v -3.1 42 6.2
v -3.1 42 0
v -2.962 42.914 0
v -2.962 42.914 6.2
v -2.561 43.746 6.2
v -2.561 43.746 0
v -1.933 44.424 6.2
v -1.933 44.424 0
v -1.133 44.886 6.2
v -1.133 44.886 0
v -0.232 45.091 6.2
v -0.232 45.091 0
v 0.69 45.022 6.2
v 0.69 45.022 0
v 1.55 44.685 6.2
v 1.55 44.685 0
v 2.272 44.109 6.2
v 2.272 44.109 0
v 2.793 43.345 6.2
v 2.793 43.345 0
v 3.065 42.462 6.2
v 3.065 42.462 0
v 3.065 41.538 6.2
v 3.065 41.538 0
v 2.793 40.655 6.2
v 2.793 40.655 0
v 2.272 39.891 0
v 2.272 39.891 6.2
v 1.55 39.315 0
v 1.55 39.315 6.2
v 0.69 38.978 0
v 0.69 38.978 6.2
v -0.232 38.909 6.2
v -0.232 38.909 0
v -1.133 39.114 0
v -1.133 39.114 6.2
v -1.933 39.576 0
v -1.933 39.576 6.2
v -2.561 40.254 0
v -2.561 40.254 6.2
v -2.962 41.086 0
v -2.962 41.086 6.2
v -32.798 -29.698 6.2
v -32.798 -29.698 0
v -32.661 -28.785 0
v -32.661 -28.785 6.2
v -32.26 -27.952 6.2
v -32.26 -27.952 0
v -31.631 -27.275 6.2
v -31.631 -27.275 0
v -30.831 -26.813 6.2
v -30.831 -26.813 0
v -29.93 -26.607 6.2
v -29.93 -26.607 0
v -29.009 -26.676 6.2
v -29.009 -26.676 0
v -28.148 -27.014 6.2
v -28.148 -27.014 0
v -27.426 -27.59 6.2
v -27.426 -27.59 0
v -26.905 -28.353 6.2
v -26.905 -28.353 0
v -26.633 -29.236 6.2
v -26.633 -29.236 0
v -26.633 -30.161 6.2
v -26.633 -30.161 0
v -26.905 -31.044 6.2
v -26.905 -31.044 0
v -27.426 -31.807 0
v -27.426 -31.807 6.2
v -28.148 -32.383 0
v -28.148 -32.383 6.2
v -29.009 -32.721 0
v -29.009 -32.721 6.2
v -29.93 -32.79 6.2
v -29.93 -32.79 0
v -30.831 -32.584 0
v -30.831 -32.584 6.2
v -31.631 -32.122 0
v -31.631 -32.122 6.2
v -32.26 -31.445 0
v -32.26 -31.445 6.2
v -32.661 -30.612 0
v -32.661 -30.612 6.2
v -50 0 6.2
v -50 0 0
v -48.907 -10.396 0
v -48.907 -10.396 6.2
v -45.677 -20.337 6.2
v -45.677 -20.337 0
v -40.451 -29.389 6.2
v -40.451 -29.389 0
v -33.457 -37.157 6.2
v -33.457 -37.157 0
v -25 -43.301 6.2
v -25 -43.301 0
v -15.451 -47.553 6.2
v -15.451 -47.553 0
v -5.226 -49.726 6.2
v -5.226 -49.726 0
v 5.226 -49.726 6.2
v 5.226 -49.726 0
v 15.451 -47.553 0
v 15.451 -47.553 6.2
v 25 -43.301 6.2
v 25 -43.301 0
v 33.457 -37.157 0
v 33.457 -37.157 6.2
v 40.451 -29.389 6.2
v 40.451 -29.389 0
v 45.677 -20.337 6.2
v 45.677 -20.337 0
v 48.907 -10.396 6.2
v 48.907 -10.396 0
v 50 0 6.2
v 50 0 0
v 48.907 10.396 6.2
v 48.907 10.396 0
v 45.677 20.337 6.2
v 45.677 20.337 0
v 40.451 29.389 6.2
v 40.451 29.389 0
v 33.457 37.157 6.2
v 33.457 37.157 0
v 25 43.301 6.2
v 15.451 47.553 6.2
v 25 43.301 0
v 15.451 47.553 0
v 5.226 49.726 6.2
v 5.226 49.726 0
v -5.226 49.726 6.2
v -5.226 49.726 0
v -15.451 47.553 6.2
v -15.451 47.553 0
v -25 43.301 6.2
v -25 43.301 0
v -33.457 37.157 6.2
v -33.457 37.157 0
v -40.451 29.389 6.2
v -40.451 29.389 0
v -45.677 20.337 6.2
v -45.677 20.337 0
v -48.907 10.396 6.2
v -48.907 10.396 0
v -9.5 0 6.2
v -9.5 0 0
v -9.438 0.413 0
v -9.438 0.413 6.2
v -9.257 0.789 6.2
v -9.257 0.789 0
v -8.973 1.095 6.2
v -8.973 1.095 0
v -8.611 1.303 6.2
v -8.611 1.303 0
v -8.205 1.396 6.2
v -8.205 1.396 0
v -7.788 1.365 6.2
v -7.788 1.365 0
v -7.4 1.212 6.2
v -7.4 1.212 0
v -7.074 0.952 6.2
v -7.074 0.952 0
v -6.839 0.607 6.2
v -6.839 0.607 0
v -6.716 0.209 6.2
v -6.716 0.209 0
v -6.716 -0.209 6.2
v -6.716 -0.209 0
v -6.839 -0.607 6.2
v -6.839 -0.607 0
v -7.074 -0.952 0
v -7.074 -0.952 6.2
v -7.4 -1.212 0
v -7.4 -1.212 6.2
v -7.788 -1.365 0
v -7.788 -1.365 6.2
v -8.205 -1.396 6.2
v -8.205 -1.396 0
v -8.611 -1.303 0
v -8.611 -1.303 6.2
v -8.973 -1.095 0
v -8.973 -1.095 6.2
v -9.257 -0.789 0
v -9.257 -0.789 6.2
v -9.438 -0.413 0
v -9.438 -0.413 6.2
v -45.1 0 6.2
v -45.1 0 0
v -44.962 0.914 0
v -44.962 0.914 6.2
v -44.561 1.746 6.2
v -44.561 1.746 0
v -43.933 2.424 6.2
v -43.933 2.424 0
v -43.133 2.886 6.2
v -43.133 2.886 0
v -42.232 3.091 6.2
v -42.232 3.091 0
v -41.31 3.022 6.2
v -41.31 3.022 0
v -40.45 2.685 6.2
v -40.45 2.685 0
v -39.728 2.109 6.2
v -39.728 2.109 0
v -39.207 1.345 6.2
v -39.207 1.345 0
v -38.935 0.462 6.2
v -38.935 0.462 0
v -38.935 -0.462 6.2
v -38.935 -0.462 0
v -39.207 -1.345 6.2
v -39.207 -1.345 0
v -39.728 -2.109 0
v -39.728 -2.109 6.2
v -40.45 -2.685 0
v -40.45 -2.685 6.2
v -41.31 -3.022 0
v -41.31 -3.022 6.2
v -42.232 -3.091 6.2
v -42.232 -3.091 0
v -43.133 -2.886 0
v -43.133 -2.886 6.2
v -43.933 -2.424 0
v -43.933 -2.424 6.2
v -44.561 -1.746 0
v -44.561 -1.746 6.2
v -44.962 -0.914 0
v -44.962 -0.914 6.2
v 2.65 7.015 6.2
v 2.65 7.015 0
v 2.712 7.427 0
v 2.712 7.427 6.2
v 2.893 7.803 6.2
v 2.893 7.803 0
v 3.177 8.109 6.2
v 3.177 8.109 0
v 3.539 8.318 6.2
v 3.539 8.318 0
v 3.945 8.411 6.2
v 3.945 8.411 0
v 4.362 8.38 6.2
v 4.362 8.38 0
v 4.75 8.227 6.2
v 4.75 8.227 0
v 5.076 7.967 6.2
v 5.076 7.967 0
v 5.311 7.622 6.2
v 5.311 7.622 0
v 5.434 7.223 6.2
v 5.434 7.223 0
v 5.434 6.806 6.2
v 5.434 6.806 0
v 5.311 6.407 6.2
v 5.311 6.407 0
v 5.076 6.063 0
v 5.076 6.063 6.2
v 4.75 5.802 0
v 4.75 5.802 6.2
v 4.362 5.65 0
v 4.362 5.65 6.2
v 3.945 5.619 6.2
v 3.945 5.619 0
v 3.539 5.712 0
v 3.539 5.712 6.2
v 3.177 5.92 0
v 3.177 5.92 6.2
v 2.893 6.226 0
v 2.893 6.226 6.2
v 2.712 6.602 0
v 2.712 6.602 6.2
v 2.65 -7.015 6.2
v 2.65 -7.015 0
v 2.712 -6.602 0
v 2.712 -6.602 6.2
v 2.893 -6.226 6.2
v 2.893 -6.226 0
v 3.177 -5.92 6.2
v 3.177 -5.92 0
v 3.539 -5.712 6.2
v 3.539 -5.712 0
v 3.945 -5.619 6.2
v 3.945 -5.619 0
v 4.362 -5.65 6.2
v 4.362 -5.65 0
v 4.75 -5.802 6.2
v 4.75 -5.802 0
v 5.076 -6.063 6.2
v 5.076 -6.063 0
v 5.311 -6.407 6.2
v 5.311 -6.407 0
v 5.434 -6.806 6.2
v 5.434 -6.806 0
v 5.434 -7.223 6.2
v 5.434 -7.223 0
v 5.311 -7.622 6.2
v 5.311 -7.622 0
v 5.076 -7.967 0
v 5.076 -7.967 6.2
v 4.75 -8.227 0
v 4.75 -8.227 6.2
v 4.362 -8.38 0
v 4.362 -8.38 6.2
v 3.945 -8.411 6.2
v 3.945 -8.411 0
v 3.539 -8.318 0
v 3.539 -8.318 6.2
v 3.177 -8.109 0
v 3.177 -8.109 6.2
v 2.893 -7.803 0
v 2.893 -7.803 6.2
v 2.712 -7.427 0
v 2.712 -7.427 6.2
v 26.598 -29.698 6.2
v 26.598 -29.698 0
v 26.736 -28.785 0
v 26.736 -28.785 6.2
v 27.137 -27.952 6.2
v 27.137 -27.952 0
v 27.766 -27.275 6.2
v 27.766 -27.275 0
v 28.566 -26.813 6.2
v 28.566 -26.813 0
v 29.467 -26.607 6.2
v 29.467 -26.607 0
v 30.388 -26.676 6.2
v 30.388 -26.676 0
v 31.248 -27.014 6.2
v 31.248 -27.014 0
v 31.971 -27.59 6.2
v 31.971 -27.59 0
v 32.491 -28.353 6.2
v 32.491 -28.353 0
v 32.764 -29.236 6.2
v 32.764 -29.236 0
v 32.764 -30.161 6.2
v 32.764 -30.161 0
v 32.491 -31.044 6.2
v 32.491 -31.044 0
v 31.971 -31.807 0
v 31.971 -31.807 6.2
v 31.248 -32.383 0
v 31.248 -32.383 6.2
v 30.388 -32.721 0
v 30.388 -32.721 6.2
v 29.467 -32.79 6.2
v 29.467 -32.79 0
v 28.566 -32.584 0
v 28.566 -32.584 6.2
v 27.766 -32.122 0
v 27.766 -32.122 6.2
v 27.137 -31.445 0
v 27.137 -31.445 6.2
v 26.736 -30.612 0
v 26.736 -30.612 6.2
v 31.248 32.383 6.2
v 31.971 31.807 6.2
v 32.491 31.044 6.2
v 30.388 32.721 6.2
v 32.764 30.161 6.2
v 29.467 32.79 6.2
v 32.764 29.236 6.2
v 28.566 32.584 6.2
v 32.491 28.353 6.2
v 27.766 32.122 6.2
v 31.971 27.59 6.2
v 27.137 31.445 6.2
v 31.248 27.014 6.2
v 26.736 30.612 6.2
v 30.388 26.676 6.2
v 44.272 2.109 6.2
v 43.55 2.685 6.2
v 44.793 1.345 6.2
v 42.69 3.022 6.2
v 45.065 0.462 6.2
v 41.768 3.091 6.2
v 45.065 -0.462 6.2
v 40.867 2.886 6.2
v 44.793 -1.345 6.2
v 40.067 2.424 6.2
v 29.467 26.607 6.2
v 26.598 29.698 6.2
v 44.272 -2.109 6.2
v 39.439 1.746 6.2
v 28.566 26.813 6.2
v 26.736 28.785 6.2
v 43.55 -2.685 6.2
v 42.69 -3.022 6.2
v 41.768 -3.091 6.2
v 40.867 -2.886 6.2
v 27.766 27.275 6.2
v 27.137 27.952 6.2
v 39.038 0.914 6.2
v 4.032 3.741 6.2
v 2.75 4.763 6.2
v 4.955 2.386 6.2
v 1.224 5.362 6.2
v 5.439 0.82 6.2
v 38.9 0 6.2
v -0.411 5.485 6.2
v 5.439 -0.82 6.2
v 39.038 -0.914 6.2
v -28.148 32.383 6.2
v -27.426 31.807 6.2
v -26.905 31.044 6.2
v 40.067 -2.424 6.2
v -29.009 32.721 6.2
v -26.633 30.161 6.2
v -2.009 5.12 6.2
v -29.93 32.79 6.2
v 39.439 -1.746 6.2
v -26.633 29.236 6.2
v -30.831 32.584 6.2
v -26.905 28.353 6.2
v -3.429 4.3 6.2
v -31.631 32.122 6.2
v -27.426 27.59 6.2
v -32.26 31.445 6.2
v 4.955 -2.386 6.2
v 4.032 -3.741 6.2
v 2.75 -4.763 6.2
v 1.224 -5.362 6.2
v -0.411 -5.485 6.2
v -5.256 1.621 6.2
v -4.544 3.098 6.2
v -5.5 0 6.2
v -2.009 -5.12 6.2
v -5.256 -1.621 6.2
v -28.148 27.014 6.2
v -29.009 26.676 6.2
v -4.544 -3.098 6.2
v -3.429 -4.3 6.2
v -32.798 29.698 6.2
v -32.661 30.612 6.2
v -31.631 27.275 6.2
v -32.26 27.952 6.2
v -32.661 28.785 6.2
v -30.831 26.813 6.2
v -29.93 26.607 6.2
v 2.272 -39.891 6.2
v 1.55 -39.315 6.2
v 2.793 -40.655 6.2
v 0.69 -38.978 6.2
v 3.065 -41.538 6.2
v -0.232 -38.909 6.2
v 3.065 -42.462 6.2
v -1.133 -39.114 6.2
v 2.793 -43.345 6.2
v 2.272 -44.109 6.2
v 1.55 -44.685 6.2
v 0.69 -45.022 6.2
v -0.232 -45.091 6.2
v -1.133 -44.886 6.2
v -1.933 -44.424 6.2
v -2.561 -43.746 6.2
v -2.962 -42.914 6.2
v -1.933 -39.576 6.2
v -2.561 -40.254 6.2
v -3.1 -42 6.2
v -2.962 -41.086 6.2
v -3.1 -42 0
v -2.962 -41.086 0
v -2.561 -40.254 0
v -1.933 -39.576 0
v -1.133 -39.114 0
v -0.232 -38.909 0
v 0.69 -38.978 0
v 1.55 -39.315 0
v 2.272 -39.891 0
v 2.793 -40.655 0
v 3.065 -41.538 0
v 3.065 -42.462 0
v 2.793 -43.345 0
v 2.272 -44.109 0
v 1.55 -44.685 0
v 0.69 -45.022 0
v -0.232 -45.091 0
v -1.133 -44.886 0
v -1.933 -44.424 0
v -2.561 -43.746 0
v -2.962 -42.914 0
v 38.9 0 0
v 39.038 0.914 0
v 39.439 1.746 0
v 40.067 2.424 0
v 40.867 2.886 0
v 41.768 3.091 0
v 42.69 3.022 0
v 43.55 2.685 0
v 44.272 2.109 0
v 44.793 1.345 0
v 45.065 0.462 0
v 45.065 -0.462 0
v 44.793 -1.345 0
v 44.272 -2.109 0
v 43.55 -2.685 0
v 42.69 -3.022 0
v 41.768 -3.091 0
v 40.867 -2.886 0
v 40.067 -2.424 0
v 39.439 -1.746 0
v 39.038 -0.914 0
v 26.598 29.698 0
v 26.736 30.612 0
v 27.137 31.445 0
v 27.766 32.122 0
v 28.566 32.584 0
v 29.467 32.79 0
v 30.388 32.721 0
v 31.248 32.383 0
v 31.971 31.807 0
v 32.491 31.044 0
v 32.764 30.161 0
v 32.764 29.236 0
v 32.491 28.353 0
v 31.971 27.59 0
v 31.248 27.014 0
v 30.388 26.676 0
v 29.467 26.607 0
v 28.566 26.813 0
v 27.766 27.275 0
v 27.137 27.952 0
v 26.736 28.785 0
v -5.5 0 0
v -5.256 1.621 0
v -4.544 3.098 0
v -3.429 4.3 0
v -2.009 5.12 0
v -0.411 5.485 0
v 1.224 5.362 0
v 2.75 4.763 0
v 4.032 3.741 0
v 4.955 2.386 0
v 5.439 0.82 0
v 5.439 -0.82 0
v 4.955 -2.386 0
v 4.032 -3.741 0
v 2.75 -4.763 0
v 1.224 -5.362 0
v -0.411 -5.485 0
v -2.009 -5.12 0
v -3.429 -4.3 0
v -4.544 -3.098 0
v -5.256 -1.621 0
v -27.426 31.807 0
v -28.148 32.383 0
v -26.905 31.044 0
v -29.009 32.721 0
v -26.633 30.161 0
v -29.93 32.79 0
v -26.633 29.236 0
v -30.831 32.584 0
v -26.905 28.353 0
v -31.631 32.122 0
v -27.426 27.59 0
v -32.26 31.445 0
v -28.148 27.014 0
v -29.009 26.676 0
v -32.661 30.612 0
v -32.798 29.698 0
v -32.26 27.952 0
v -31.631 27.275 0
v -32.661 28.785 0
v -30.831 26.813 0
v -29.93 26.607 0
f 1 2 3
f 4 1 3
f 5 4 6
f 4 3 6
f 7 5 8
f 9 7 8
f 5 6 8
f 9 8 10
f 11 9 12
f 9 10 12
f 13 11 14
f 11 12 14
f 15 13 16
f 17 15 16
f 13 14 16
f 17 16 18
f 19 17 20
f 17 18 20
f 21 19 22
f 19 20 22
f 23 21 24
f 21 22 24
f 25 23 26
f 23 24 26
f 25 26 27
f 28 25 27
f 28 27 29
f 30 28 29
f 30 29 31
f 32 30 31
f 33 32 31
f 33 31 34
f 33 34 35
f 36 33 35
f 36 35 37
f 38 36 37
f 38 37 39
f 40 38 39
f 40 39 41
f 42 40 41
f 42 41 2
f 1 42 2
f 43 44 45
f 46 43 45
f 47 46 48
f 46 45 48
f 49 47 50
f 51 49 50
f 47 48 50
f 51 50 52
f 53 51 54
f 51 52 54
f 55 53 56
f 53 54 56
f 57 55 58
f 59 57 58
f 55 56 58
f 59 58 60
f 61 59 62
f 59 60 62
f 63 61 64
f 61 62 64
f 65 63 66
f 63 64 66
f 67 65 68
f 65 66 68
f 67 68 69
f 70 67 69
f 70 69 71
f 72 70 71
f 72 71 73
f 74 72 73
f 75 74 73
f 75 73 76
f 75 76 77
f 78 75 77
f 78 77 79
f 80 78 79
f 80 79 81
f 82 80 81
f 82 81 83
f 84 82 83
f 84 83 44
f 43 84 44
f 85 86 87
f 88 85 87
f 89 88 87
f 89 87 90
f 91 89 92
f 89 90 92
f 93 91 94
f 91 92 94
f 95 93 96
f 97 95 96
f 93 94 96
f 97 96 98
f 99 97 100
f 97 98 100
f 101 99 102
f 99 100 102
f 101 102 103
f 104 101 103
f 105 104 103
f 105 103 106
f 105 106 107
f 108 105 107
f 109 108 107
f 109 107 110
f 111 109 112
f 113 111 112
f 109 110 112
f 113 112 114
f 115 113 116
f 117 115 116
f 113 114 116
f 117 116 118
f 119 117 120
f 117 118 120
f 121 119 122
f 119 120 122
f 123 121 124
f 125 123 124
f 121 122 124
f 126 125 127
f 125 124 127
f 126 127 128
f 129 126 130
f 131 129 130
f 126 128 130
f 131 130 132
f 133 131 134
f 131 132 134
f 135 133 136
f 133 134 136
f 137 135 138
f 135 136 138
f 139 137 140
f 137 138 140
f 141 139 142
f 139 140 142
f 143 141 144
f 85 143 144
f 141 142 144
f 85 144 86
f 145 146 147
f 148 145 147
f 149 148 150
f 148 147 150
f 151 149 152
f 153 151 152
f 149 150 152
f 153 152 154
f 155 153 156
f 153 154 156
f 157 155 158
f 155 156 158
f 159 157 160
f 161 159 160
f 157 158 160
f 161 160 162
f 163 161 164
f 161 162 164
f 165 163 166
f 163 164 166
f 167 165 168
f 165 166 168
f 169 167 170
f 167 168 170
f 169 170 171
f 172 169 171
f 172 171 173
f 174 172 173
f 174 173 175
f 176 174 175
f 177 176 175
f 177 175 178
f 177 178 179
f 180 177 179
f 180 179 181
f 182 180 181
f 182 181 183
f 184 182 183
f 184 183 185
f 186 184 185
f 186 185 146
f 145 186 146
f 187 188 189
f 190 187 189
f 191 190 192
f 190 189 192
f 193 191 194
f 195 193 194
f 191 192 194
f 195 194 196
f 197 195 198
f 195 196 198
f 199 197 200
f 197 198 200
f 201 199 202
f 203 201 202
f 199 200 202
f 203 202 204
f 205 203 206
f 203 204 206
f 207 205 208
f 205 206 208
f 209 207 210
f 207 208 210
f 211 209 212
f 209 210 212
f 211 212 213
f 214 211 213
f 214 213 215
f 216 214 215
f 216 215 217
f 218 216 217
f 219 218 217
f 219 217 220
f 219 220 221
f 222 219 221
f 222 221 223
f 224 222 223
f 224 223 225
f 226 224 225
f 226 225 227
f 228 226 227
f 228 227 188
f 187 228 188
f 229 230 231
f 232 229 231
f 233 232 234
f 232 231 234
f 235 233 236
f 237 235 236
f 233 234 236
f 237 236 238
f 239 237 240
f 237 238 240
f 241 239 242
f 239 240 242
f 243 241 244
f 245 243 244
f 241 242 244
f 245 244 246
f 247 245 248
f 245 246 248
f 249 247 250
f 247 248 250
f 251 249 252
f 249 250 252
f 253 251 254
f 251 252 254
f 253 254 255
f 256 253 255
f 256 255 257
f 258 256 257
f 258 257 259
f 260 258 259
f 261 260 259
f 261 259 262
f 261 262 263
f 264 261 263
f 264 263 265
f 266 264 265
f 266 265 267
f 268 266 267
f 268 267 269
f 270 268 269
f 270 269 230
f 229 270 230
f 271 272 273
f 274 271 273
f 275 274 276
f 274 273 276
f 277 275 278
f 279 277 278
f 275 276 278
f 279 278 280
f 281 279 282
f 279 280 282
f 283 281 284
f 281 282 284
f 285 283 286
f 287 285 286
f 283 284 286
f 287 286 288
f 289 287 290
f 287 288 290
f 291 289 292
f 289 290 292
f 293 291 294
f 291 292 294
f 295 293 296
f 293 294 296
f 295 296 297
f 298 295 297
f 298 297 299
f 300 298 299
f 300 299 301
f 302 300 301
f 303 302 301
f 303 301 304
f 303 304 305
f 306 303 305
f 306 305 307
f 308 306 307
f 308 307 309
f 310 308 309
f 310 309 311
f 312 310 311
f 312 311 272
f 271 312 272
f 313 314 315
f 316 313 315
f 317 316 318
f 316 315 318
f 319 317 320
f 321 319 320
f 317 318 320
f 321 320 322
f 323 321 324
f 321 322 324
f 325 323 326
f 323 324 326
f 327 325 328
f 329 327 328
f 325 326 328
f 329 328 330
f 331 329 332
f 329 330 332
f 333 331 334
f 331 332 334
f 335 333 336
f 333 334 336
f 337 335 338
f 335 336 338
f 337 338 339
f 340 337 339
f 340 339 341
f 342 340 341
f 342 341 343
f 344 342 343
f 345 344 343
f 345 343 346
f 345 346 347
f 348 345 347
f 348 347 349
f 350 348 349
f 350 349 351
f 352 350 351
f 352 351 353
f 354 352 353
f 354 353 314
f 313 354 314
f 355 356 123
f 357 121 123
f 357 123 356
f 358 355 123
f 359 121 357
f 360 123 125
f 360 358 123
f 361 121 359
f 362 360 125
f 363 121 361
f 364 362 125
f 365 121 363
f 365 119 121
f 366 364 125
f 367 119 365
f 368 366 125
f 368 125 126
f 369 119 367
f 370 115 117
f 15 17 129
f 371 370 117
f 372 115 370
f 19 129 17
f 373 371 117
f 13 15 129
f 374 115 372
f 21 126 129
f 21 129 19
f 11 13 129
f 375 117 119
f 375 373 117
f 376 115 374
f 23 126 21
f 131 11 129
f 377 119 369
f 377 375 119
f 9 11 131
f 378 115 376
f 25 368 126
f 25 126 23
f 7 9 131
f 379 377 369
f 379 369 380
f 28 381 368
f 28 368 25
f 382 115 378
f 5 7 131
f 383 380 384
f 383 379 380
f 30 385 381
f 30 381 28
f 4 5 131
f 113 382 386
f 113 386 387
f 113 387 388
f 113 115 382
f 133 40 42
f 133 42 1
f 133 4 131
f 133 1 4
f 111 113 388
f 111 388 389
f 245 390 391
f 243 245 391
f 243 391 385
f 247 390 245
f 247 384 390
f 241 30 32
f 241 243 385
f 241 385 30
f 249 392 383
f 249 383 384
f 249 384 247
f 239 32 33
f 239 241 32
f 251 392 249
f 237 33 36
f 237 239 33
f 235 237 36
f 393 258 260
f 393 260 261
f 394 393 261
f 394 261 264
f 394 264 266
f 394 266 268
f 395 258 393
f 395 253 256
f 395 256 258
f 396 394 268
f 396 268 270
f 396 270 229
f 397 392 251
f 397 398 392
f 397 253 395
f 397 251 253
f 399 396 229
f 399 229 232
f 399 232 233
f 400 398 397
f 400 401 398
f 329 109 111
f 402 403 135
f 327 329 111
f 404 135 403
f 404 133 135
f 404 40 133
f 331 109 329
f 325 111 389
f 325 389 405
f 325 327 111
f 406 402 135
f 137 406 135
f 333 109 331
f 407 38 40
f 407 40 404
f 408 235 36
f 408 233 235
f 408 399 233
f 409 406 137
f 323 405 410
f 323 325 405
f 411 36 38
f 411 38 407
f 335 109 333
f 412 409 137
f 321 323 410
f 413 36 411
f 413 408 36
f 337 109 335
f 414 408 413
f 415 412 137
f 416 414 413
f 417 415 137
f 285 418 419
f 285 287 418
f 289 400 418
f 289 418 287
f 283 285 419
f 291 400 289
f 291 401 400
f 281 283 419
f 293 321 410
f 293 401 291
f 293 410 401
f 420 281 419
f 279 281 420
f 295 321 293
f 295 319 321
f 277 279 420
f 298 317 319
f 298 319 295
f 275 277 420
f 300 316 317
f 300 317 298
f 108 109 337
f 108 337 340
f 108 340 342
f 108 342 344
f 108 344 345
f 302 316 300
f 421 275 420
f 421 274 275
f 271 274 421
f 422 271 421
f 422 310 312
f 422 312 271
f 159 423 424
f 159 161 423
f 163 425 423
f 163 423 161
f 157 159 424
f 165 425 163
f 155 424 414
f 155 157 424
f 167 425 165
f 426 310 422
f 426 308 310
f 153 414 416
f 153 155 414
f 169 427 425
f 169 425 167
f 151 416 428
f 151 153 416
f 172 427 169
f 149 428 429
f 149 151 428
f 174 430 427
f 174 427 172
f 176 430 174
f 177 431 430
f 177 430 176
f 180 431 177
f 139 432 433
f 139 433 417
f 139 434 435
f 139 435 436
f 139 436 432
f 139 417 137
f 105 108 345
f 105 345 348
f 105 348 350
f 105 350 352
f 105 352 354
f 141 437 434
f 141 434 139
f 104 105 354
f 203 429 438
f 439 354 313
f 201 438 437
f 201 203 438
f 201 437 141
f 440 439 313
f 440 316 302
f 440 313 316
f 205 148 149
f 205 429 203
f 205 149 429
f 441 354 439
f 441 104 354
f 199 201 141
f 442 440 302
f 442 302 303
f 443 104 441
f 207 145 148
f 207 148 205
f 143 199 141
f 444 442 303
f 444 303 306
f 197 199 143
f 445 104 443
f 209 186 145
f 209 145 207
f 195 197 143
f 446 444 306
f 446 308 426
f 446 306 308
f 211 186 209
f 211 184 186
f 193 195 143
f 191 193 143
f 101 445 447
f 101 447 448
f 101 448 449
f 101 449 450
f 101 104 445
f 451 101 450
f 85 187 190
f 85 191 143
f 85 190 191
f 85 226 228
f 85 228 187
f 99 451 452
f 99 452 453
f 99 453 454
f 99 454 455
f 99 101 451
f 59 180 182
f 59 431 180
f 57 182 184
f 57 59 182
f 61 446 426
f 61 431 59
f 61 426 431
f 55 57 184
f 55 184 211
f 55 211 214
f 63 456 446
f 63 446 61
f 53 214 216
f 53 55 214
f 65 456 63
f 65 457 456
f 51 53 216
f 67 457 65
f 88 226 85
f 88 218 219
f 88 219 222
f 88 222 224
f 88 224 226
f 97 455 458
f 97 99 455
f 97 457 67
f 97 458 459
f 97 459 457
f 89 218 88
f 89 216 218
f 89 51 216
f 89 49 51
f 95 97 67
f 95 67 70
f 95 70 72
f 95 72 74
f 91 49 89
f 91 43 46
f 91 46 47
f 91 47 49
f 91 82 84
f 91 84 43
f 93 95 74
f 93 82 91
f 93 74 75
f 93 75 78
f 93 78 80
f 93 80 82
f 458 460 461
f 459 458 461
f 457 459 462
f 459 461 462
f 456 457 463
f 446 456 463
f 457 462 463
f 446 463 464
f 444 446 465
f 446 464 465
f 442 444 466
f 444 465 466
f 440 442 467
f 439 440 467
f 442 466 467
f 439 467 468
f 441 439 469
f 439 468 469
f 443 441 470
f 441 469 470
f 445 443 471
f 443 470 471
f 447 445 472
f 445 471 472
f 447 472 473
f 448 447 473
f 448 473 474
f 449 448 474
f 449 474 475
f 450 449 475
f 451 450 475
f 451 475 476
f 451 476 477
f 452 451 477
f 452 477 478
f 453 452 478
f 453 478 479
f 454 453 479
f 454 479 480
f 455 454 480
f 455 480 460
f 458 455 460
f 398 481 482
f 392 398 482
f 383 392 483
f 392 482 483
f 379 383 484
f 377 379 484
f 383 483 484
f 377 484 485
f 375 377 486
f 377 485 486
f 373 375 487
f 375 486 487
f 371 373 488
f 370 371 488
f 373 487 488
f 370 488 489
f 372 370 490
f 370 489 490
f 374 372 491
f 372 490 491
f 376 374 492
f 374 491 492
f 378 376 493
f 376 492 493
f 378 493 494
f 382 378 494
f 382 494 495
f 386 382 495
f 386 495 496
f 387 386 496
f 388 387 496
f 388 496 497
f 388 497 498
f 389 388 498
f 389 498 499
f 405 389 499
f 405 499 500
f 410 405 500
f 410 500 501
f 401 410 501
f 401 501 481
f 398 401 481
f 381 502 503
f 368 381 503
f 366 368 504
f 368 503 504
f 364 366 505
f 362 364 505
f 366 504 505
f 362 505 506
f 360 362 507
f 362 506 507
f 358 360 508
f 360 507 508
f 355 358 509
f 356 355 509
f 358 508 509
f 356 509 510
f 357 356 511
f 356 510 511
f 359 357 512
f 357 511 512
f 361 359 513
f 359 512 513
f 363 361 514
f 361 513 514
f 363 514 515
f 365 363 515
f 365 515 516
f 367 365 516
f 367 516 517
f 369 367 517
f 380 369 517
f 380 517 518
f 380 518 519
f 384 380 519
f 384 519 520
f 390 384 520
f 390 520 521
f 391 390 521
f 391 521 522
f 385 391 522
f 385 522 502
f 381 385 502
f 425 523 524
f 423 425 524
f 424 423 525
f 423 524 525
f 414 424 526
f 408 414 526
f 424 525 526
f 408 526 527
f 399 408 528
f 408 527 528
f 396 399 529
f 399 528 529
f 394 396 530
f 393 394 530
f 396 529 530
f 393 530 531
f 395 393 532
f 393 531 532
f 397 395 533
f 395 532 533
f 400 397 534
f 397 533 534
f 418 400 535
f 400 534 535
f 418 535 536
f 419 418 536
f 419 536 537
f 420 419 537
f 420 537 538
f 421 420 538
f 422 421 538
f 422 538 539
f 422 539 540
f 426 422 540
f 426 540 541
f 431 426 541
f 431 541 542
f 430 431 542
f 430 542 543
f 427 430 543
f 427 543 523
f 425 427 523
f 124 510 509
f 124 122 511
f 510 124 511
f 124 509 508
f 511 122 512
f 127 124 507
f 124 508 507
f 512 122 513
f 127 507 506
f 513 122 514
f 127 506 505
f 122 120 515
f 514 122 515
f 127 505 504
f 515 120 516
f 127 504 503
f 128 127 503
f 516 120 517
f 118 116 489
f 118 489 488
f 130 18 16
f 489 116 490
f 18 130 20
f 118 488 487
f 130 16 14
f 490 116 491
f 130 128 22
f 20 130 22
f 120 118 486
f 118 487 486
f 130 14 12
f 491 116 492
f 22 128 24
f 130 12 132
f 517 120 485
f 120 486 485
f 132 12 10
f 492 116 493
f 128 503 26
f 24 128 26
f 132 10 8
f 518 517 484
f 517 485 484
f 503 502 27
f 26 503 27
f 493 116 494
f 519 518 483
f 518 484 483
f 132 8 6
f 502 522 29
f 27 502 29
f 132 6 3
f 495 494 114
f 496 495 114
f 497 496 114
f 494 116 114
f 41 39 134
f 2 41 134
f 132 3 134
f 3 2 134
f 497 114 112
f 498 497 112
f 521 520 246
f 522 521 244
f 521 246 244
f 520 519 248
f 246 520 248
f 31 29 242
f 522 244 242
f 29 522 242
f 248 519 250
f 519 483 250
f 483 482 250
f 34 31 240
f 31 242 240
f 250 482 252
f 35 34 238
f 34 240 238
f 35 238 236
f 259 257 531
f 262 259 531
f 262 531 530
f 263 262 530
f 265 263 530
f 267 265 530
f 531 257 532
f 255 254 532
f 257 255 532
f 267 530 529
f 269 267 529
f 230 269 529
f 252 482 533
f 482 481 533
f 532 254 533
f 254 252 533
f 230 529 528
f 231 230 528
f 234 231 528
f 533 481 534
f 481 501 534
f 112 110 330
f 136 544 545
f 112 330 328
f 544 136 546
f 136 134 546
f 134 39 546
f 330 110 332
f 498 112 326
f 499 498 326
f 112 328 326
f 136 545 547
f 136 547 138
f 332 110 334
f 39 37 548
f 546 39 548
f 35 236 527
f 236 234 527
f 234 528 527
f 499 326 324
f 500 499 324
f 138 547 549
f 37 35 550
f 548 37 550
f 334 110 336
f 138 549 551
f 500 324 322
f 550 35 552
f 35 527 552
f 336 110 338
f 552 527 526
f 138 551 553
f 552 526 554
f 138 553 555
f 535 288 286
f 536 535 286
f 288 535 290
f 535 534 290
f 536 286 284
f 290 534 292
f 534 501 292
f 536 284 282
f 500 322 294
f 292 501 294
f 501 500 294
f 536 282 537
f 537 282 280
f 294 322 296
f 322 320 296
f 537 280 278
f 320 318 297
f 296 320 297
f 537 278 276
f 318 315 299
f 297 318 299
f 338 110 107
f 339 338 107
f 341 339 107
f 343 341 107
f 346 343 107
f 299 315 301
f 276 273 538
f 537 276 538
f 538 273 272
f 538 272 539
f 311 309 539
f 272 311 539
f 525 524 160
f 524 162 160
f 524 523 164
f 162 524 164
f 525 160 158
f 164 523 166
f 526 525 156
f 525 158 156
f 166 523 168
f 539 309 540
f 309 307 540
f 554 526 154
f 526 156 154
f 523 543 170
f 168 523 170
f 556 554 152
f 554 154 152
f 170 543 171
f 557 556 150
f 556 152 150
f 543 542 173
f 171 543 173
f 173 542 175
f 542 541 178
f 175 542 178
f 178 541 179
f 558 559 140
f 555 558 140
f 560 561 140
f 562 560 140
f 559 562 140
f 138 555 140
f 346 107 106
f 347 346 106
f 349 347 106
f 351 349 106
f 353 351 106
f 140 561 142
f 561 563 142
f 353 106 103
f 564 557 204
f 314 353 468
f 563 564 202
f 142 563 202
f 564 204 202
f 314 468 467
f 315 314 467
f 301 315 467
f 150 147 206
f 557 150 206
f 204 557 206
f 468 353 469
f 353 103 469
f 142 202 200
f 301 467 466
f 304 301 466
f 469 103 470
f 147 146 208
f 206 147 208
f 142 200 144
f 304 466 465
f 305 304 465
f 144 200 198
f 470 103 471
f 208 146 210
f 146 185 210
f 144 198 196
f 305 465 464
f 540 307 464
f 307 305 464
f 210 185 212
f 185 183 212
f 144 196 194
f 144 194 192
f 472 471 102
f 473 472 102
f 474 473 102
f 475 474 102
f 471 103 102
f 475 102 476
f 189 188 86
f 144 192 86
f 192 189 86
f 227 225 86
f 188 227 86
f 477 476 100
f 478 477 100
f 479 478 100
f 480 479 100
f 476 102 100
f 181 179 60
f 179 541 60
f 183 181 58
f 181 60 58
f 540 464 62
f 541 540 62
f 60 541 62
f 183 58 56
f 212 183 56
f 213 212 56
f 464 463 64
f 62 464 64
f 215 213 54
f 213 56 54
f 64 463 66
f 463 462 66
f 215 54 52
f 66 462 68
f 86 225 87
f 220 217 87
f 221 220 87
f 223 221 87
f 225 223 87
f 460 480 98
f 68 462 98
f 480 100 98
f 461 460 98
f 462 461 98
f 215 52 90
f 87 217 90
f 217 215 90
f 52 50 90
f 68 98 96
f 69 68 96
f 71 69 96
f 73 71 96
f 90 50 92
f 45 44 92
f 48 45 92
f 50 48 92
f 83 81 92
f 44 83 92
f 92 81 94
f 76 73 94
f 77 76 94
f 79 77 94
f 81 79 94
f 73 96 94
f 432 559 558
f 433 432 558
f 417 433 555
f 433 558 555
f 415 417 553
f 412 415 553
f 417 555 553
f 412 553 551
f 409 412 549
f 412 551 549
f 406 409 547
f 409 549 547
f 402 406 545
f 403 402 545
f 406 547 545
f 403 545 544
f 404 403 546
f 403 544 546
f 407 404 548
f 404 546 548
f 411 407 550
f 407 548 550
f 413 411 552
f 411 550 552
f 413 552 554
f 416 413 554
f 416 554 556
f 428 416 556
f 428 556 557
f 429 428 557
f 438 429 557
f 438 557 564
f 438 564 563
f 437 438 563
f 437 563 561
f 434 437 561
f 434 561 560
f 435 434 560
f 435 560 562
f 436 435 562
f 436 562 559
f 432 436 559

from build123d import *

# Parameters (mm, degrees)
SKETCH1_R           = 50
BOSS_EXTRUDE1_DEPTH = 6.2
SKETCH2_R           = 5.5
CUT_EXTRUDE1_DEPTH  = 71.981969542
SKETCH3_R           = 1.4
CUT_EXTRUDE2_DEPTH  = 71.981969542
SKETCH4_R           = 3.1
CUT_EXTRUDE3_DEPTH  = 71.981969542


with BuildPart() as part:
    # Sketch1 → Boss-Extrude1 (new body)
    with BuildSketch(Plane.XY):
        with Locations(Location((0, 0, 0), (0, 0, 180))):
            Circle(SKETCH1_R)
    extrude(amount=BOSS_EXTRUDE1_DEPTH)

    # Sketch2 → Cut-Extrude1 (cut, through all)
    with BuildSketch(Plane(origin=(0, 0, 0), x_dir=(-1, 0, 0), z_dir=(0, 0, -1))):
        Circle(SKETCH2_R)
    extrude(amount=-CUT_EXTRUDE1_DEPTH, mode=Mode.SUBTRACT)

    # Sketch3 → Cut-Extrude2 (cut, through all)
    with BuildSketch(Plane(origin=(0, 0, 0), x_dir=(-1, 0, 0), z_dir=(0, 0, -1))):
        with Locations((8.1, 0)):
            Circle(SKETCH3_R)
        with Locations((-4.05, -7.014805771)):
            Circle(SKETCH3_R)
        with Locations((-4.05, 7.014805771)):
            Circle(SKETCH3_R)
    extrude(amount=-CUT_EXTRUDE2_DEPTH, mode=Mode.SUBTRACT)

    # Sketch4 → Cut-Extrude3 (cut, through all)
    with BuildSketch(Plane(origin=(0, 0, 0), x_dir=(-1, 0, 0), z_dir=(0, 0, -1))):
        with Locations((42, 0)):
            Circle(SKETCH4_R)
        with Locations((29.69848481, -29.69848481)):
            Circle(SKETCH4_R)
        with Locations((0, -42)):
            Circle(SKETCH4_R)
        with Locations((-29.69848481, -29.69848481)):
            Circle(SKETCH4_R)
        with Locations((-42, 0)):
            Circle(SKETCH4_R)
        with Locations((-29.69848481, 29.69848481)):
            Circle(SKETCH4_R)
        with Locations((0, 42)):
            Circle(SKETCH4_R)
        with Locations((29.69848481, 29.69848481)):
            Circle(SKETCH4_R)
    extrude(amount=-CUT_EXTRUDE3_DEPTH, mode=Mode.SUBTRACT)


solid = part.part
